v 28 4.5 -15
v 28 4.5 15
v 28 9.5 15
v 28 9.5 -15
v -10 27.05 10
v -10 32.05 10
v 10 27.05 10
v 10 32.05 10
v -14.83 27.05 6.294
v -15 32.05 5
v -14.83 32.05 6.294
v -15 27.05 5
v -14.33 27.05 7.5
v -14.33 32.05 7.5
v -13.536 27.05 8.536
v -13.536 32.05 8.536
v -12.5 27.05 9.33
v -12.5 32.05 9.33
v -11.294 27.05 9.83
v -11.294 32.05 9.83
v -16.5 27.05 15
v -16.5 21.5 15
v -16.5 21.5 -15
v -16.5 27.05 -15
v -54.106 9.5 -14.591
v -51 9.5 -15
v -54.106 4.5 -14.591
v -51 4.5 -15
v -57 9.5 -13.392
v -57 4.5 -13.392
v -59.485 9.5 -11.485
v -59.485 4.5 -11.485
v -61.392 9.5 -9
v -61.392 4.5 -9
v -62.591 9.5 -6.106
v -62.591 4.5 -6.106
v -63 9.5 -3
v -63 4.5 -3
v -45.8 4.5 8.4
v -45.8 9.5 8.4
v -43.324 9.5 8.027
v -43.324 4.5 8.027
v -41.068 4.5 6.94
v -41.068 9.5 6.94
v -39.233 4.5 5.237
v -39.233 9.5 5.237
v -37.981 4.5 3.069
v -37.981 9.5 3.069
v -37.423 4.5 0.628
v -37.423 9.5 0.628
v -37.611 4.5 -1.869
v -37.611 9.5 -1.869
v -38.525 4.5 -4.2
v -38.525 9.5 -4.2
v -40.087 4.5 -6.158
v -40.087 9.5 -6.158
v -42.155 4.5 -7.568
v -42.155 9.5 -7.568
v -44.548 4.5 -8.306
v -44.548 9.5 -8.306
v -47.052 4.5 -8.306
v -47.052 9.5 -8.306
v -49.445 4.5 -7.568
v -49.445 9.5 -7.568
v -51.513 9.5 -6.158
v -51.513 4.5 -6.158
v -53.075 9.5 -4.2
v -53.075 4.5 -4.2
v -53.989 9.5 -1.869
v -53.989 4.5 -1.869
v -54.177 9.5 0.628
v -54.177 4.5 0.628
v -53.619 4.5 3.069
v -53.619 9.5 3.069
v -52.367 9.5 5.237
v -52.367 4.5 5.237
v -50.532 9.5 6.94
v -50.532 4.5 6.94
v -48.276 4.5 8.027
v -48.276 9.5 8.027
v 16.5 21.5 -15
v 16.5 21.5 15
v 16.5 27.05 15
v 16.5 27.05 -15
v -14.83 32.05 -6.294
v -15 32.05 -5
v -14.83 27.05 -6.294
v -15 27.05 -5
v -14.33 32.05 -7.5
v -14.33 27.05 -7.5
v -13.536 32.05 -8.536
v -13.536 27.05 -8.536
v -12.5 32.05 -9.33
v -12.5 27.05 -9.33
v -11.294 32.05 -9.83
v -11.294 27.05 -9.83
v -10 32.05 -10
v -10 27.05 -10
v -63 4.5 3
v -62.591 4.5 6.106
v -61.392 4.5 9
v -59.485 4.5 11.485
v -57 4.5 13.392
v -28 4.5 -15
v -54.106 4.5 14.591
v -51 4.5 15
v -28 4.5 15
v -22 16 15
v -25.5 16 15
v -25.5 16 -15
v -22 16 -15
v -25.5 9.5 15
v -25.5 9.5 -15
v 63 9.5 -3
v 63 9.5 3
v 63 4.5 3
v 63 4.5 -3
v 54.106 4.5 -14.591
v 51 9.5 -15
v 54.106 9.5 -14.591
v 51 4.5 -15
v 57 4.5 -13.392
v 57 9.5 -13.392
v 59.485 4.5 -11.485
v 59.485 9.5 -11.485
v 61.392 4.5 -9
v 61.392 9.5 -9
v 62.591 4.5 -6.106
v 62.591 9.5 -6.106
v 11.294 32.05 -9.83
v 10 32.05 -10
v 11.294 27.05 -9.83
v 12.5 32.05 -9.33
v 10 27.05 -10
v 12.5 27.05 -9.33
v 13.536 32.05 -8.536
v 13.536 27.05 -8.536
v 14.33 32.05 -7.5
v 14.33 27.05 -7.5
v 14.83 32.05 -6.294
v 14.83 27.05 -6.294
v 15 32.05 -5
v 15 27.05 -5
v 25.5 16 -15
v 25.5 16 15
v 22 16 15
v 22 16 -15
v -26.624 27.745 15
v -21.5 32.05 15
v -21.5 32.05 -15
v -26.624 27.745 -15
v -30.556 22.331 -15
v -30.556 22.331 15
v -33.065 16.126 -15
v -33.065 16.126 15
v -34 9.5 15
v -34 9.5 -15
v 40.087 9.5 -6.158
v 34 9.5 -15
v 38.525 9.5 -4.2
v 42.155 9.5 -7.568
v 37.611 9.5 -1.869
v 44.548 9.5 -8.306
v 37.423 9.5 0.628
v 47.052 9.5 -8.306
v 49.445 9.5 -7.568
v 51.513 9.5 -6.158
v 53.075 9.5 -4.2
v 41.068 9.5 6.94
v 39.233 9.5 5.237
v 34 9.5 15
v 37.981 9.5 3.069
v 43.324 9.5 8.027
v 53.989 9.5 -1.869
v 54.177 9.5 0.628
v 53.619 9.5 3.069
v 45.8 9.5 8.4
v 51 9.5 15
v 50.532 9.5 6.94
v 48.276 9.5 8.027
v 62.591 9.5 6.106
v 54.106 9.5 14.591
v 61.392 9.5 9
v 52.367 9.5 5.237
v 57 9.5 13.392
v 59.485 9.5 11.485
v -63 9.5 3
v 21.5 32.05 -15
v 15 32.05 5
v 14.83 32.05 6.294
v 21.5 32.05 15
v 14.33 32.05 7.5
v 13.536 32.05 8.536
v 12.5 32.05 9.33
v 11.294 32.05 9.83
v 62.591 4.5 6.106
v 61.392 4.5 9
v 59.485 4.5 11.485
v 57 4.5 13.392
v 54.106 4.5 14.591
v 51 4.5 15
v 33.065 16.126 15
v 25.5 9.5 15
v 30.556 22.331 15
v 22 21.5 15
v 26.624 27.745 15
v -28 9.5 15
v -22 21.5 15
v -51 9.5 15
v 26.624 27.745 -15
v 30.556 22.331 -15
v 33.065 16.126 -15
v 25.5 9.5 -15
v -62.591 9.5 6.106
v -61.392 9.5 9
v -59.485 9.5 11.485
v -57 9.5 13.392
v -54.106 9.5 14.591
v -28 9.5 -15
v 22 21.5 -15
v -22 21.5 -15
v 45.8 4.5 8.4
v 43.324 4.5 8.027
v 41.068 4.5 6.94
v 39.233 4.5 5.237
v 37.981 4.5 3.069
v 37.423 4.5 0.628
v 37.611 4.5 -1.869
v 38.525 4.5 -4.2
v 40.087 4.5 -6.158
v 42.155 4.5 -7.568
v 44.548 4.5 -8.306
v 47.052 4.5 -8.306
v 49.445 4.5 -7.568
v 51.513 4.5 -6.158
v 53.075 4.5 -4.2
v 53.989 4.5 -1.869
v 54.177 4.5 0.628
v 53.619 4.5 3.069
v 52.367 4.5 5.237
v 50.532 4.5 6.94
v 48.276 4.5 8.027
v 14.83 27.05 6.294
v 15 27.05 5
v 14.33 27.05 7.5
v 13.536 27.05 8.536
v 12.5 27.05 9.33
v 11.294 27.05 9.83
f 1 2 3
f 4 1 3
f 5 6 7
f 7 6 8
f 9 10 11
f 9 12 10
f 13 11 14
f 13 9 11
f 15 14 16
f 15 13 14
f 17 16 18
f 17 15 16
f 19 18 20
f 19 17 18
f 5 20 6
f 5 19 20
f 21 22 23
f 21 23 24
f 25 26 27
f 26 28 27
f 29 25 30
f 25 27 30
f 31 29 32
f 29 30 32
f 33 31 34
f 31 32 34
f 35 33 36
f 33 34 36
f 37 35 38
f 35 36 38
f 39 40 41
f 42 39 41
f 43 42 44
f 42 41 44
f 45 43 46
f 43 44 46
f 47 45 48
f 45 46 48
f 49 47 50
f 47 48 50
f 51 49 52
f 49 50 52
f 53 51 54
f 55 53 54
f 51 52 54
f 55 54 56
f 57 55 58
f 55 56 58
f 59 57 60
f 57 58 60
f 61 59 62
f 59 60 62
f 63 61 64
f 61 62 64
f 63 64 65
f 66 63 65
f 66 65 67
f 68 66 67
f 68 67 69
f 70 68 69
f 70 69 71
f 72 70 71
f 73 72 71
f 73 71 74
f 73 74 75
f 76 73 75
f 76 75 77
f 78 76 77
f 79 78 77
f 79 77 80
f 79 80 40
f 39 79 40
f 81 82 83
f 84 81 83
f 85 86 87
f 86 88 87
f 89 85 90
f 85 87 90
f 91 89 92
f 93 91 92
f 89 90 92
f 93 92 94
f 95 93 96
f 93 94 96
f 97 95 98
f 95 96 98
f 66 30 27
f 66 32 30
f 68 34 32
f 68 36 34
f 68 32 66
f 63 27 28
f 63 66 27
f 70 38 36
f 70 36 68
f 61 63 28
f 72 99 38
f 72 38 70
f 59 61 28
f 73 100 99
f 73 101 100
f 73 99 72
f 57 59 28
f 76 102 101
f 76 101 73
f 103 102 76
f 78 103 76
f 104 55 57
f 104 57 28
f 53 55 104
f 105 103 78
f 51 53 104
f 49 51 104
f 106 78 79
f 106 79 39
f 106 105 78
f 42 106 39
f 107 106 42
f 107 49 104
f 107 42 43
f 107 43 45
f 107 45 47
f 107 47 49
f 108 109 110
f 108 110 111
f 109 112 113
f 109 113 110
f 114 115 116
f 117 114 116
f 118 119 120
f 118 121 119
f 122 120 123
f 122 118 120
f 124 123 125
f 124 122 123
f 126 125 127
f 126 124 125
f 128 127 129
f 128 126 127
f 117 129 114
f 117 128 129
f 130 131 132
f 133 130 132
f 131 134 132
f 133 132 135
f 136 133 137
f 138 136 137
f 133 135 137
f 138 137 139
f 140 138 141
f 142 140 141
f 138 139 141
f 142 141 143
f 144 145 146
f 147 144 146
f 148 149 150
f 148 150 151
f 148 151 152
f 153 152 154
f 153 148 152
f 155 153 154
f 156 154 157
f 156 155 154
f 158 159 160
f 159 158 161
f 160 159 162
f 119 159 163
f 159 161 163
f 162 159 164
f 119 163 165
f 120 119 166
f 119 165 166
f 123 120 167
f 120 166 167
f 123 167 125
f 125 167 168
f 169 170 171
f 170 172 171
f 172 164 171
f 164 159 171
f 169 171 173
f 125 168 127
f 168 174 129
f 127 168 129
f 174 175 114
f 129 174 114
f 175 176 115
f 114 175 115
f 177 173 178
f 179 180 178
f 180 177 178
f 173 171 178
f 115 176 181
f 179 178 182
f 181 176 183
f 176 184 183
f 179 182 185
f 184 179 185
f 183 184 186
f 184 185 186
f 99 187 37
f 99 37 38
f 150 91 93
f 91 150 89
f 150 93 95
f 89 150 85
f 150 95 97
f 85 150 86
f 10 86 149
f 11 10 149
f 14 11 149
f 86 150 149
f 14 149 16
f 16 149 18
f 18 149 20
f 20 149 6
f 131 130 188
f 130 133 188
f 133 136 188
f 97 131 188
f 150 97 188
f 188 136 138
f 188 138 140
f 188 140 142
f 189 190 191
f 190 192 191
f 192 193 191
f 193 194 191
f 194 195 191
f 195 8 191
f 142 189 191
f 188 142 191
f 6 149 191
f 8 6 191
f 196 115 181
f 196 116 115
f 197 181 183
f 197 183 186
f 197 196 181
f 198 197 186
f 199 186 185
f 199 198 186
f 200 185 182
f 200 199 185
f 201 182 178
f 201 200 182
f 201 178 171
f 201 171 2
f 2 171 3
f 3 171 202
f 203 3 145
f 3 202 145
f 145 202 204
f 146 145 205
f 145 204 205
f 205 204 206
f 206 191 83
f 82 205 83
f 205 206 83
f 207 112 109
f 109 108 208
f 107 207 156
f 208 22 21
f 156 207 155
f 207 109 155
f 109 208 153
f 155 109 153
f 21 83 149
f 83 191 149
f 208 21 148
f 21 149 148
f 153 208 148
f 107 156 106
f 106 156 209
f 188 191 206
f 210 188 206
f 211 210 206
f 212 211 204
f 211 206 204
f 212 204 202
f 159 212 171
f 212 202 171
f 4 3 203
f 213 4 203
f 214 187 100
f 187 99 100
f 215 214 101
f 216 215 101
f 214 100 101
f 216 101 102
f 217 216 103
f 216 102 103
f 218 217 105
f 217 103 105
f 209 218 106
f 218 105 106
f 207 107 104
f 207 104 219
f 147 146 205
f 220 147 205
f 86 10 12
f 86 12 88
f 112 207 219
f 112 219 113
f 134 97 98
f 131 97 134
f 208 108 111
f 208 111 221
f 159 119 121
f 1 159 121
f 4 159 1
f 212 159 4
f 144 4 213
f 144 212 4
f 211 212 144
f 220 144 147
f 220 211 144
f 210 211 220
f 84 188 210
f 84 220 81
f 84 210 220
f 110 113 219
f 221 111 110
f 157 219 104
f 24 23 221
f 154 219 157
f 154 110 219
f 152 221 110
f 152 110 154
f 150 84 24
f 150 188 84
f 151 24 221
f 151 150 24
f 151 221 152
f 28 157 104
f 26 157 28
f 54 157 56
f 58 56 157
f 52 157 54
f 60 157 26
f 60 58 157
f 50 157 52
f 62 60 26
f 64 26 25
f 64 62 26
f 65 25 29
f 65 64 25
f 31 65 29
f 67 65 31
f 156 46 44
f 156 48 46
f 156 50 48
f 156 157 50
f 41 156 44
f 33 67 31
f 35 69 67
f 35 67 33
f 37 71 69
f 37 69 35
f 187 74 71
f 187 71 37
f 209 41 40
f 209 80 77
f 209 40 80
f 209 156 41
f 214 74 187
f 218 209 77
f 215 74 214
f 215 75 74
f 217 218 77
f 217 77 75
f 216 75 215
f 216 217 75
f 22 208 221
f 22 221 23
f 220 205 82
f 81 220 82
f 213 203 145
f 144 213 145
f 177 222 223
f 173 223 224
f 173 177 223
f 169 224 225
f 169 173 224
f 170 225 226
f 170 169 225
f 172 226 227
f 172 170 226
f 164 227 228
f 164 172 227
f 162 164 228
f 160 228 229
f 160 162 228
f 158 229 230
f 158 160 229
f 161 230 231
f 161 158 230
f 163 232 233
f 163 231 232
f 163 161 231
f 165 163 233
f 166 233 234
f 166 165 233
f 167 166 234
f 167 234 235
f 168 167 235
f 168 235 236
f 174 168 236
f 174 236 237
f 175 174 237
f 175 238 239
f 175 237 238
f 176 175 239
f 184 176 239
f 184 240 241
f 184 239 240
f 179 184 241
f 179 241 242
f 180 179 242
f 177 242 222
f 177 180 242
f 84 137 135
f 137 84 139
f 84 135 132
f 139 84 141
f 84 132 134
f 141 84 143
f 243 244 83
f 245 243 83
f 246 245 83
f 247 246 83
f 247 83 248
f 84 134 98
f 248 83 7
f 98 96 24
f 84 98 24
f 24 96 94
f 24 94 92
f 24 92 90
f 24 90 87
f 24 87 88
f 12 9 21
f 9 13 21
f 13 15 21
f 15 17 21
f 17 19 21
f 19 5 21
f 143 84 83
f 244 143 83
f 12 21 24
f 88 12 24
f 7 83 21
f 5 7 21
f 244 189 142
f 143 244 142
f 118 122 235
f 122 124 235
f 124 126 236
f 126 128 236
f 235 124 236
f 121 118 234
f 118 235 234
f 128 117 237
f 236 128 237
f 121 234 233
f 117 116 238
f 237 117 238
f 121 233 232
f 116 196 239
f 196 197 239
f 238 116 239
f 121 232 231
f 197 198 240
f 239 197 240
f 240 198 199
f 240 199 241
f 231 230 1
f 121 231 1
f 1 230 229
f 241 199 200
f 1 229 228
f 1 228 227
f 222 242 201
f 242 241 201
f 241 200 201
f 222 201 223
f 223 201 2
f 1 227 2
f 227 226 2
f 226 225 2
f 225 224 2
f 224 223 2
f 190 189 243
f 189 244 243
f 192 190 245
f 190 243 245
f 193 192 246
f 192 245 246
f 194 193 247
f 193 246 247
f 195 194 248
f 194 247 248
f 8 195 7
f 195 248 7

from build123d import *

# Parameters (mm, degrees)
EXTRUDE_THIN1_DEPTH  = 15
SKETCH2_R            = 8.4
CUT_EXTRUDE1_DEPTH   = 69.574794932
FILLET1_R            = 12
FILLET1_OF_MIRROR1_R = 12
SKETCH3_W            = 30
SKETCH3_H            = 20
CUT_EXTRUDE2_DEPTH   = 71.377571001
BOSS_EXTRUDE1_DEPTH  = 30
FILLET2_R            = 5


with BuildPart() as part:
    # Sketch1 → Extrude-Thin1 (new, symmetric)
    with BuildSketch(Plane.XY):
        Polygon((-63, 4.5), (-28, 4.5), (-28, 9.5), (-25.5, 9.5), (-25.5, 16), (-22, 16), (-22, 21.5), (-16.5, 21.5), (-16.5, 27.05), (0, 27.05), (0, 32.05), (-21.5, 32.05), (-21.5, 26.5), (-27, 26.5), (-27, 21), (-30.5, 21), (-30.5, 14.5), (-33, 14.5), (-33, 9.5), (-63, 9.5), align=None)
    extrude_thin1 = extrude(amount=EXTRUDE_THIN1_DEPTH, both=True)

    # Sketch2 → Cut-Extrude1 (cut, through all)
    with BuildSketch(Plane(origin=(0, 9.5, 0), x_dir=(1, 0, 0), z_dir=(0, 1, 0))):
        with Locations(Location((-45.8, 0, 0), (0, 0, 270))):
            Circle(SKETCH2_R)
    cut_extrude1 = extrude(amount=-CUT_EXTRUDE1_DEPTH, mode=Mode.SUBTRACT)

    # Fillet1
    fillet1_edges = [part.edges().sort_by_distance(p)[0] for p in [
        (-63, 7, -15),
        (-63, 7, 15),
    ]]
    fillet(fillet1_edges, radius=FILLET1_R)

    # Mirror1: Extrude-Thin1, Cut-Extrude1 across plane
    add(extrude_thin1.mirror(Plane(origin=(0, 32.05, 15), x_dir=(0, 0, 1), z_dir=(1, 0, 0))))
    add(cut_extrude1.mirror(Plane(origin=(0, 32.05, 15), x_dir=(0, 0, 1), z_dir=(1, 0, 0))), mode=Mode.SUBTRACT)

    # Fillet1 of Mirror1
    fillet1_of_mirror1_edges = [part.edges().sort_by_distance(p)[0] for p in [
        (63, 7, -15),
        (63, 7, 15),
    ]]
    fillet(fillet1_of_mirror1_edges, radius=FILLET1_OF_MIRROR1_R)

    # Sketch3 → Cut-Extrude2 (cut, through all)
    with BuildSketch(Plane(origin=(0, 32.05, 0), x_dir=(1, 0, 0), z_dir=(0, 1, 0))):
        Rectangle(SKETCH3_W, SKETCH3_H)
    extrude(amount=-CUT_EXTRUDE2_DEPTH, mode=Mode.SUBTRACT)

    # Sketch4 → Boss-Extrude1 (add)
    with BuildSketch(Plane.XY.offset(15)):
        with BuildLine():
            Line((-21.5, 26.5), (-21.5, 32.05))
            ThreePointArc((-21.5, 32.05), (-30.55647166, 22.330693825), (-34, 9.5))
            Line((-34, 9.5), (-33, 9.5))
            Line((-33, 9.5), (-33, 14.5))
            Line((-33, 14.5), (-30.5, 14.5))
            Line((-30.5, 14.5), (-30.5, 21))
            Line((-30.5, 21), (-27, 21))
            Line((-27, 21), (-27, 26.5))
            Line((-27, 26.5), (-21.5, 26.5))
        make_face()
    boss_extrude1 = extrude(amount=-BOSS_EXTRUDE1_DEPTH)

    # Mirror2: Boss-Extrude1 across plane
    add(boss_extrude1.mirror(Plane(origin=(0, 0, 0), x_dir=(0, 0, 1), z_dir=(1, 0, 0))))

    # Fillet2
    fillet2_edges = [part.edges().sort_by_distance(p)[0] for p in [
        (-15, 29.55, 10),
        (-15, 29.55, -10),
        (15, 29.55, -10),
        (15, 29.55, 10),
    ]]
    fillet(fillet2_edges, radius=FILLET2_R)


solid = part.part
